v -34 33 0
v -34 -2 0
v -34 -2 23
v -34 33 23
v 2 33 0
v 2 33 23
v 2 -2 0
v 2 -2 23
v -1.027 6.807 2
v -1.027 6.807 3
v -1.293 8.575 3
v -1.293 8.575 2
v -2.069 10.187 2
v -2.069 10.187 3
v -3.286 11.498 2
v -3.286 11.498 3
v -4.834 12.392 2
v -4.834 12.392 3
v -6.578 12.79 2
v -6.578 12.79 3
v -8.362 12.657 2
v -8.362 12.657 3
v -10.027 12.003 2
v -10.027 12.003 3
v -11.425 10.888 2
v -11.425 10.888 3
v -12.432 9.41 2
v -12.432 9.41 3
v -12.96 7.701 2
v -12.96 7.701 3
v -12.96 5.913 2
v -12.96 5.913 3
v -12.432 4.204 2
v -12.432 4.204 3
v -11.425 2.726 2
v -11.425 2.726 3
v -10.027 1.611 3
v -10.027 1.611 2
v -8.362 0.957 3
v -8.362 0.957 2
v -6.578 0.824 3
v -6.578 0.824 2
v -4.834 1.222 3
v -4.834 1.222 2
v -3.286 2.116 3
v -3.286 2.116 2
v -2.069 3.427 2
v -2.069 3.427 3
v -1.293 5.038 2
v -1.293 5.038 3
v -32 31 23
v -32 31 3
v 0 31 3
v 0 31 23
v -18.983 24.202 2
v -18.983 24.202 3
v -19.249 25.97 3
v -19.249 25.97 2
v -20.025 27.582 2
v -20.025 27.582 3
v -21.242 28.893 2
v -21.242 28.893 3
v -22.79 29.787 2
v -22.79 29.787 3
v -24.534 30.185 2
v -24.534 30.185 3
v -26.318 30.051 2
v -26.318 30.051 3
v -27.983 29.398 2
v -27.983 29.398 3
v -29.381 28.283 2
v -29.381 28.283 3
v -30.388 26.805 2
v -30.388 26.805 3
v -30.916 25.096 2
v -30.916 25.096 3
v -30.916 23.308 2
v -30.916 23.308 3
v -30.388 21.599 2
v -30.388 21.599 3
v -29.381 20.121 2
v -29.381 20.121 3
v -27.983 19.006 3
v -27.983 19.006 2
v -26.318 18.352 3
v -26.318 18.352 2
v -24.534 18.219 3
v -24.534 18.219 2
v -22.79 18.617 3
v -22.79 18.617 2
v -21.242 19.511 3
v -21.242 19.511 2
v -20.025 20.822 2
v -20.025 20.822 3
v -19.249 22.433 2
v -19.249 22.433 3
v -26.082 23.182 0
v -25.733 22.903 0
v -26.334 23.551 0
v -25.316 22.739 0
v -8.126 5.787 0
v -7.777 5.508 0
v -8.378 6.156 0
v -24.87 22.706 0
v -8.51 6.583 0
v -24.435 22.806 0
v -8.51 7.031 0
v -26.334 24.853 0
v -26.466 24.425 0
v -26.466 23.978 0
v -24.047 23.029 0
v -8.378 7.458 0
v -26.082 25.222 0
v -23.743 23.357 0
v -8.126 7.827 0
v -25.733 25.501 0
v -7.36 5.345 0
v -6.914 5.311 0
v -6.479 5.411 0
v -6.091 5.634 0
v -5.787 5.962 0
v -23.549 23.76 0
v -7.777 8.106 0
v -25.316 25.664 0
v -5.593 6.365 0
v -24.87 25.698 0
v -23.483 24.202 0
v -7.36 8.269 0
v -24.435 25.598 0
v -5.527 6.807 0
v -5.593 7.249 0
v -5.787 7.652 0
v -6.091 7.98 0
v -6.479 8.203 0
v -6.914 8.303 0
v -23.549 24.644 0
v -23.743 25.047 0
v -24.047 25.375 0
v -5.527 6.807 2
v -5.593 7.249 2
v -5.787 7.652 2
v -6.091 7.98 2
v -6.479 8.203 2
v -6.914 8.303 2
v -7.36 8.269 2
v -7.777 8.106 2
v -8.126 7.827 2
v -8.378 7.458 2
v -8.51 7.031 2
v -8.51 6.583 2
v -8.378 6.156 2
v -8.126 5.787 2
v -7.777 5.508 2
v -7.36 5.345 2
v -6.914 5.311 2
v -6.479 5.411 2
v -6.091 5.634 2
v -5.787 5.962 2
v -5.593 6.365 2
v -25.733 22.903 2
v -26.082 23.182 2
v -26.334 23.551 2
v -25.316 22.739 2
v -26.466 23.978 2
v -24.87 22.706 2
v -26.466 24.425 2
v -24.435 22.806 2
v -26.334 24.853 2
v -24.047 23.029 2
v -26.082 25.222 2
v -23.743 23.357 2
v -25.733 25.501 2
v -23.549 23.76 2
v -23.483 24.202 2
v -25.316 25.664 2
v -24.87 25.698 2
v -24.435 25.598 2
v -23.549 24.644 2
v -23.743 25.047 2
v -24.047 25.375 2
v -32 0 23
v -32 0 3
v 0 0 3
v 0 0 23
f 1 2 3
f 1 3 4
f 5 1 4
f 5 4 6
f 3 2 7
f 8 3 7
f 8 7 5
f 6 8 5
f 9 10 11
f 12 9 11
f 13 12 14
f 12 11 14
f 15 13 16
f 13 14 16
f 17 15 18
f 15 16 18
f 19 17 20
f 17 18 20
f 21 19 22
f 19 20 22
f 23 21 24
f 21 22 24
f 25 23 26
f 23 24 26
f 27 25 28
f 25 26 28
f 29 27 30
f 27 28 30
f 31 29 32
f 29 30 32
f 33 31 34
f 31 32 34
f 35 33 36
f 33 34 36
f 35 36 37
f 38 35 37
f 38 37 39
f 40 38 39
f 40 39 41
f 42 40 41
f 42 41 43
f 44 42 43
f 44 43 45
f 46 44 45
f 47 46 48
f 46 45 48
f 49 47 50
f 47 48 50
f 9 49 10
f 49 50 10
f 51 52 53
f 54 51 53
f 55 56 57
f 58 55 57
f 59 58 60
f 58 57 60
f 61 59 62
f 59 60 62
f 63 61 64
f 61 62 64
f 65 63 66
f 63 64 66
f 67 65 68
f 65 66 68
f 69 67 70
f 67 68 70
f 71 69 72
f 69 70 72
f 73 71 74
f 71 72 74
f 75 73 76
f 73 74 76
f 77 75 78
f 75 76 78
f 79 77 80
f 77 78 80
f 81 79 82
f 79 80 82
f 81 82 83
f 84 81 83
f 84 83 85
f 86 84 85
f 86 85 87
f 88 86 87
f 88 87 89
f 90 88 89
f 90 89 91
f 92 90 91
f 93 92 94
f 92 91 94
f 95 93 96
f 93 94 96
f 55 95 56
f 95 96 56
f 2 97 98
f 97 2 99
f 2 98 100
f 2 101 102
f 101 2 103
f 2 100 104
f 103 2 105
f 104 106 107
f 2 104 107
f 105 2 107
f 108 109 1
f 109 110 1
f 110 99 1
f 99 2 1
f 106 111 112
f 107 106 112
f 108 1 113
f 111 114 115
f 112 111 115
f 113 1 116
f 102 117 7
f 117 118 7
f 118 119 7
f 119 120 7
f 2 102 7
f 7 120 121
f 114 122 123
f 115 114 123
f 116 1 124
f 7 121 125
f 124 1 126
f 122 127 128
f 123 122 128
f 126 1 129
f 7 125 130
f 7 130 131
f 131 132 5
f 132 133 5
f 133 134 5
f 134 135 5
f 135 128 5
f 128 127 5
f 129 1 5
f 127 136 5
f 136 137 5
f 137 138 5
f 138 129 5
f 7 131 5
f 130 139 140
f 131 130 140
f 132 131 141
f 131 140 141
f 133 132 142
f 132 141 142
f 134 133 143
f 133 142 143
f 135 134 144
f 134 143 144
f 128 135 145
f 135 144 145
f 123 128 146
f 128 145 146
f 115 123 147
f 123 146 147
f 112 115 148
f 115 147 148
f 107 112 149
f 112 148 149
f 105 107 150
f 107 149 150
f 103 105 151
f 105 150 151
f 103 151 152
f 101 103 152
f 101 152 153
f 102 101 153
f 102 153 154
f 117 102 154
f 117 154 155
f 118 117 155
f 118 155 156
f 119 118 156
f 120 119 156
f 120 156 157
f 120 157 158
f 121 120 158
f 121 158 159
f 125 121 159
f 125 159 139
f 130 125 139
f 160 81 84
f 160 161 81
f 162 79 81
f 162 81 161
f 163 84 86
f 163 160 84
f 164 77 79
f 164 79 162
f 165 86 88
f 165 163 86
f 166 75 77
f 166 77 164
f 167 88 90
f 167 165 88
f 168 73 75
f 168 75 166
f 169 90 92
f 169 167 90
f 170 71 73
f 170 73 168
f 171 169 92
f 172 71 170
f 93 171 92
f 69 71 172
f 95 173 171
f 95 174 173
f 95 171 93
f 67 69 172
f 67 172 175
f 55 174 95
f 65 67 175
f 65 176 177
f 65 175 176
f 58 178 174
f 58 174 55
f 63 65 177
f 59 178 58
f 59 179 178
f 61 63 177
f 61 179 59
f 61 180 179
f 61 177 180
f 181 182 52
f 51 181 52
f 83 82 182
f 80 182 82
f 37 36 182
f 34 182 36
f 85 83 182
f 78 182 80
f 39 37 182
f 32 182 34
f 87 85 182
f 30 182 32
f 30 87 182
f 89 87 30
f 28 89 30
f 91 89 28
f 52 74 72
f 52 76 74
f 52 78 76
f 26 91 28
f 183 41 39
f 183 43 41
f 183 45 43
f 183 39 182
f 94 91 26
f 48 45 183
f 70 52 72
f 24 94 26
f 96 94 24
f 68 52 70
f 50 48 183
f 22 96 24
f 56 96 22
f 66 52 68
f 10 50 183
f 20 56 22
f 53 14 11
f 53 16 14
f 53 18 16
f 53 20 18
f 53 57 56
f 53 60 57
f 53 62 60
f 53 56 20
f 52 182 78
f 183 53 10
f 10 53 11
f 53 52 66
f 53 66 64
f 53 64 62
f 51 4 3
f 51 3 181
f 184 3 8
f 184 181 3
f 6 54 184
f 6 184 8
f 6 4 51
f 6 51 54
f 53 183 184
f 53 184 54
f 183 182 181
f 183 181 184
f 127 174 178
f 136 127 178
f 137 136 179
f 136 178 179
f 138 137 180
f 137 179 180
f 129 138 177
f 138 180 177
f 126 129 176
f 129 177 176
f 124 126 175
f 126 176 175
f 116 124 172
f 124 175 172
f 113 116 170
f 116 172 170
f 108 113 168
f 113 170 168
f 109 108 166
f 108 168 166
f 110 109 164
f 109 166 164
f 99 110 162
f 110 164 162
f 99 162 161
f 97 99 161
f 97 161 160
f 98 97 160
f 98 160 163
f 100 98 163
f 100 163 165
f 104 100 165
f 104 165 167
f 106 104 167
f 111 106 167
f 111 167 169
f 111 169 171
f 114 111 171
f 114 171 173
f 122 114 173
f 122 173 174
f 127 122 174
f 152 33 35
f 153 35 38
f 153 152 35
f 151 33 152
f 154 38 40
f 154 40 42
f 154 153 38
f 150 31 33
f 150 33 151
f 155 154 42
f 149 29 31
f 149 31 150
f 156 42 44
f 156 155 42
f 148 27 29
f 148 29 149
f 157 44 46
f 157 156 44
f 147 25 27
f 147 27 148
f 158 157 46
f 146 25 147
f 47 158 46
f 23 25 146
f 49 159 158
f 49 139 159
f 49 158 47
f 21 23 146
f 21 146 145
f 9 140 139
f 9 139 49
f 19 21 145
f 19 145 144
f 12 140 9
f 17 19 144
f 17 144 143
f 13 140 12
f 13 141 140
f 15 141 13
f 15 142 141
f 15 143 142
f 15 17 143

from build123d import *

# Parameters (mm, degrees)
ESQUISSE1_W             = 32
ESQUISSE1_H             = 31
BOSS_EXTRU_1_DEPTH      = 3
BOSS_EXTRU_2_DEPTH      = 20
BOSS_EXTRU_2_DEPTH_BACK = 3
ESQUISSE2_W             = 36
ESQUISSE2_H             = 35
ESQUISSE2_W_2           = 32
ESQUISSE2_H_2           = 31
ESQUISSE3_R             = 1.5
ENL_V_MAT_EXTRU_1_DEPTH = 52.429563482
ESQUISSE4_R             = 6
ENL_V_MAT_EXTRU_2_DEPTH = 1


with BuildPart() as part:
    # Esquisse1 → Boss.-Extru.1 (new body)
    with BuildSketch(Plane.XY):
        with Locations((-16, 15.5)):
            Rectangle(ESQUISSE1_W, ESQUISSE1_H)
    extrude(amount=BOSS_EXTRU_1_DEPTH)

    # Esquisse2 → Boss.-Extru.2 (add, two sides: drawn at the far end of the back side and taken through both)
    with BuildSketch(Plane.XY.offset(3).offset(-BOSS_EXTRU_2_DEPTH_BACK)):
        with Locations((-16, 15.5)):
            Rectangle(ESQUISSE2_W, ESQUISSE2_H)
        with Locations((-16, 15.5)):
            Rectangle(ESQUISSE2_W_2, ESQUISSE2_H_2, mode=Mode.SUBTRACT)
    extrude(amount=BOSS_EXTRU_2_DEPTH + BOSS_EXTRU_2_DEPTH_BACK)

    # Esquisse3 → Enlèv. mat.-Extru.1 (cut, through all)
    with BuildSketch(Plane.XY.offset(3)):
        with Locations((-24.982527988, 24.201823988)):
            Circle(ESQUISSE3_R)
        with Locations((-7.026522418, 6.806943593)):
            Circle(ESQUISSE3_R)
    extrude(amount=-ENL_V_MAT_EXTRU_1_DEPTH, mode=Mode.SUBTRACT)

    # Esquisse4 → Enlèv. mat.-Extru.2 (cut)
    with BuildSketch(Plane.XY.offset(3)):
        with Locations((-24.982527988, 24.201823988)):
            Circle(ESQUISSE4_R)
        with Locations((-7.026522418, 6.806943593)):
            Circle(ESQUISSE4_R)
    extrude(amount=-ENL_V_MAT_EXTRU_2_DEPTH, mode=Mode.SUBTRACT)


solid = part.part
